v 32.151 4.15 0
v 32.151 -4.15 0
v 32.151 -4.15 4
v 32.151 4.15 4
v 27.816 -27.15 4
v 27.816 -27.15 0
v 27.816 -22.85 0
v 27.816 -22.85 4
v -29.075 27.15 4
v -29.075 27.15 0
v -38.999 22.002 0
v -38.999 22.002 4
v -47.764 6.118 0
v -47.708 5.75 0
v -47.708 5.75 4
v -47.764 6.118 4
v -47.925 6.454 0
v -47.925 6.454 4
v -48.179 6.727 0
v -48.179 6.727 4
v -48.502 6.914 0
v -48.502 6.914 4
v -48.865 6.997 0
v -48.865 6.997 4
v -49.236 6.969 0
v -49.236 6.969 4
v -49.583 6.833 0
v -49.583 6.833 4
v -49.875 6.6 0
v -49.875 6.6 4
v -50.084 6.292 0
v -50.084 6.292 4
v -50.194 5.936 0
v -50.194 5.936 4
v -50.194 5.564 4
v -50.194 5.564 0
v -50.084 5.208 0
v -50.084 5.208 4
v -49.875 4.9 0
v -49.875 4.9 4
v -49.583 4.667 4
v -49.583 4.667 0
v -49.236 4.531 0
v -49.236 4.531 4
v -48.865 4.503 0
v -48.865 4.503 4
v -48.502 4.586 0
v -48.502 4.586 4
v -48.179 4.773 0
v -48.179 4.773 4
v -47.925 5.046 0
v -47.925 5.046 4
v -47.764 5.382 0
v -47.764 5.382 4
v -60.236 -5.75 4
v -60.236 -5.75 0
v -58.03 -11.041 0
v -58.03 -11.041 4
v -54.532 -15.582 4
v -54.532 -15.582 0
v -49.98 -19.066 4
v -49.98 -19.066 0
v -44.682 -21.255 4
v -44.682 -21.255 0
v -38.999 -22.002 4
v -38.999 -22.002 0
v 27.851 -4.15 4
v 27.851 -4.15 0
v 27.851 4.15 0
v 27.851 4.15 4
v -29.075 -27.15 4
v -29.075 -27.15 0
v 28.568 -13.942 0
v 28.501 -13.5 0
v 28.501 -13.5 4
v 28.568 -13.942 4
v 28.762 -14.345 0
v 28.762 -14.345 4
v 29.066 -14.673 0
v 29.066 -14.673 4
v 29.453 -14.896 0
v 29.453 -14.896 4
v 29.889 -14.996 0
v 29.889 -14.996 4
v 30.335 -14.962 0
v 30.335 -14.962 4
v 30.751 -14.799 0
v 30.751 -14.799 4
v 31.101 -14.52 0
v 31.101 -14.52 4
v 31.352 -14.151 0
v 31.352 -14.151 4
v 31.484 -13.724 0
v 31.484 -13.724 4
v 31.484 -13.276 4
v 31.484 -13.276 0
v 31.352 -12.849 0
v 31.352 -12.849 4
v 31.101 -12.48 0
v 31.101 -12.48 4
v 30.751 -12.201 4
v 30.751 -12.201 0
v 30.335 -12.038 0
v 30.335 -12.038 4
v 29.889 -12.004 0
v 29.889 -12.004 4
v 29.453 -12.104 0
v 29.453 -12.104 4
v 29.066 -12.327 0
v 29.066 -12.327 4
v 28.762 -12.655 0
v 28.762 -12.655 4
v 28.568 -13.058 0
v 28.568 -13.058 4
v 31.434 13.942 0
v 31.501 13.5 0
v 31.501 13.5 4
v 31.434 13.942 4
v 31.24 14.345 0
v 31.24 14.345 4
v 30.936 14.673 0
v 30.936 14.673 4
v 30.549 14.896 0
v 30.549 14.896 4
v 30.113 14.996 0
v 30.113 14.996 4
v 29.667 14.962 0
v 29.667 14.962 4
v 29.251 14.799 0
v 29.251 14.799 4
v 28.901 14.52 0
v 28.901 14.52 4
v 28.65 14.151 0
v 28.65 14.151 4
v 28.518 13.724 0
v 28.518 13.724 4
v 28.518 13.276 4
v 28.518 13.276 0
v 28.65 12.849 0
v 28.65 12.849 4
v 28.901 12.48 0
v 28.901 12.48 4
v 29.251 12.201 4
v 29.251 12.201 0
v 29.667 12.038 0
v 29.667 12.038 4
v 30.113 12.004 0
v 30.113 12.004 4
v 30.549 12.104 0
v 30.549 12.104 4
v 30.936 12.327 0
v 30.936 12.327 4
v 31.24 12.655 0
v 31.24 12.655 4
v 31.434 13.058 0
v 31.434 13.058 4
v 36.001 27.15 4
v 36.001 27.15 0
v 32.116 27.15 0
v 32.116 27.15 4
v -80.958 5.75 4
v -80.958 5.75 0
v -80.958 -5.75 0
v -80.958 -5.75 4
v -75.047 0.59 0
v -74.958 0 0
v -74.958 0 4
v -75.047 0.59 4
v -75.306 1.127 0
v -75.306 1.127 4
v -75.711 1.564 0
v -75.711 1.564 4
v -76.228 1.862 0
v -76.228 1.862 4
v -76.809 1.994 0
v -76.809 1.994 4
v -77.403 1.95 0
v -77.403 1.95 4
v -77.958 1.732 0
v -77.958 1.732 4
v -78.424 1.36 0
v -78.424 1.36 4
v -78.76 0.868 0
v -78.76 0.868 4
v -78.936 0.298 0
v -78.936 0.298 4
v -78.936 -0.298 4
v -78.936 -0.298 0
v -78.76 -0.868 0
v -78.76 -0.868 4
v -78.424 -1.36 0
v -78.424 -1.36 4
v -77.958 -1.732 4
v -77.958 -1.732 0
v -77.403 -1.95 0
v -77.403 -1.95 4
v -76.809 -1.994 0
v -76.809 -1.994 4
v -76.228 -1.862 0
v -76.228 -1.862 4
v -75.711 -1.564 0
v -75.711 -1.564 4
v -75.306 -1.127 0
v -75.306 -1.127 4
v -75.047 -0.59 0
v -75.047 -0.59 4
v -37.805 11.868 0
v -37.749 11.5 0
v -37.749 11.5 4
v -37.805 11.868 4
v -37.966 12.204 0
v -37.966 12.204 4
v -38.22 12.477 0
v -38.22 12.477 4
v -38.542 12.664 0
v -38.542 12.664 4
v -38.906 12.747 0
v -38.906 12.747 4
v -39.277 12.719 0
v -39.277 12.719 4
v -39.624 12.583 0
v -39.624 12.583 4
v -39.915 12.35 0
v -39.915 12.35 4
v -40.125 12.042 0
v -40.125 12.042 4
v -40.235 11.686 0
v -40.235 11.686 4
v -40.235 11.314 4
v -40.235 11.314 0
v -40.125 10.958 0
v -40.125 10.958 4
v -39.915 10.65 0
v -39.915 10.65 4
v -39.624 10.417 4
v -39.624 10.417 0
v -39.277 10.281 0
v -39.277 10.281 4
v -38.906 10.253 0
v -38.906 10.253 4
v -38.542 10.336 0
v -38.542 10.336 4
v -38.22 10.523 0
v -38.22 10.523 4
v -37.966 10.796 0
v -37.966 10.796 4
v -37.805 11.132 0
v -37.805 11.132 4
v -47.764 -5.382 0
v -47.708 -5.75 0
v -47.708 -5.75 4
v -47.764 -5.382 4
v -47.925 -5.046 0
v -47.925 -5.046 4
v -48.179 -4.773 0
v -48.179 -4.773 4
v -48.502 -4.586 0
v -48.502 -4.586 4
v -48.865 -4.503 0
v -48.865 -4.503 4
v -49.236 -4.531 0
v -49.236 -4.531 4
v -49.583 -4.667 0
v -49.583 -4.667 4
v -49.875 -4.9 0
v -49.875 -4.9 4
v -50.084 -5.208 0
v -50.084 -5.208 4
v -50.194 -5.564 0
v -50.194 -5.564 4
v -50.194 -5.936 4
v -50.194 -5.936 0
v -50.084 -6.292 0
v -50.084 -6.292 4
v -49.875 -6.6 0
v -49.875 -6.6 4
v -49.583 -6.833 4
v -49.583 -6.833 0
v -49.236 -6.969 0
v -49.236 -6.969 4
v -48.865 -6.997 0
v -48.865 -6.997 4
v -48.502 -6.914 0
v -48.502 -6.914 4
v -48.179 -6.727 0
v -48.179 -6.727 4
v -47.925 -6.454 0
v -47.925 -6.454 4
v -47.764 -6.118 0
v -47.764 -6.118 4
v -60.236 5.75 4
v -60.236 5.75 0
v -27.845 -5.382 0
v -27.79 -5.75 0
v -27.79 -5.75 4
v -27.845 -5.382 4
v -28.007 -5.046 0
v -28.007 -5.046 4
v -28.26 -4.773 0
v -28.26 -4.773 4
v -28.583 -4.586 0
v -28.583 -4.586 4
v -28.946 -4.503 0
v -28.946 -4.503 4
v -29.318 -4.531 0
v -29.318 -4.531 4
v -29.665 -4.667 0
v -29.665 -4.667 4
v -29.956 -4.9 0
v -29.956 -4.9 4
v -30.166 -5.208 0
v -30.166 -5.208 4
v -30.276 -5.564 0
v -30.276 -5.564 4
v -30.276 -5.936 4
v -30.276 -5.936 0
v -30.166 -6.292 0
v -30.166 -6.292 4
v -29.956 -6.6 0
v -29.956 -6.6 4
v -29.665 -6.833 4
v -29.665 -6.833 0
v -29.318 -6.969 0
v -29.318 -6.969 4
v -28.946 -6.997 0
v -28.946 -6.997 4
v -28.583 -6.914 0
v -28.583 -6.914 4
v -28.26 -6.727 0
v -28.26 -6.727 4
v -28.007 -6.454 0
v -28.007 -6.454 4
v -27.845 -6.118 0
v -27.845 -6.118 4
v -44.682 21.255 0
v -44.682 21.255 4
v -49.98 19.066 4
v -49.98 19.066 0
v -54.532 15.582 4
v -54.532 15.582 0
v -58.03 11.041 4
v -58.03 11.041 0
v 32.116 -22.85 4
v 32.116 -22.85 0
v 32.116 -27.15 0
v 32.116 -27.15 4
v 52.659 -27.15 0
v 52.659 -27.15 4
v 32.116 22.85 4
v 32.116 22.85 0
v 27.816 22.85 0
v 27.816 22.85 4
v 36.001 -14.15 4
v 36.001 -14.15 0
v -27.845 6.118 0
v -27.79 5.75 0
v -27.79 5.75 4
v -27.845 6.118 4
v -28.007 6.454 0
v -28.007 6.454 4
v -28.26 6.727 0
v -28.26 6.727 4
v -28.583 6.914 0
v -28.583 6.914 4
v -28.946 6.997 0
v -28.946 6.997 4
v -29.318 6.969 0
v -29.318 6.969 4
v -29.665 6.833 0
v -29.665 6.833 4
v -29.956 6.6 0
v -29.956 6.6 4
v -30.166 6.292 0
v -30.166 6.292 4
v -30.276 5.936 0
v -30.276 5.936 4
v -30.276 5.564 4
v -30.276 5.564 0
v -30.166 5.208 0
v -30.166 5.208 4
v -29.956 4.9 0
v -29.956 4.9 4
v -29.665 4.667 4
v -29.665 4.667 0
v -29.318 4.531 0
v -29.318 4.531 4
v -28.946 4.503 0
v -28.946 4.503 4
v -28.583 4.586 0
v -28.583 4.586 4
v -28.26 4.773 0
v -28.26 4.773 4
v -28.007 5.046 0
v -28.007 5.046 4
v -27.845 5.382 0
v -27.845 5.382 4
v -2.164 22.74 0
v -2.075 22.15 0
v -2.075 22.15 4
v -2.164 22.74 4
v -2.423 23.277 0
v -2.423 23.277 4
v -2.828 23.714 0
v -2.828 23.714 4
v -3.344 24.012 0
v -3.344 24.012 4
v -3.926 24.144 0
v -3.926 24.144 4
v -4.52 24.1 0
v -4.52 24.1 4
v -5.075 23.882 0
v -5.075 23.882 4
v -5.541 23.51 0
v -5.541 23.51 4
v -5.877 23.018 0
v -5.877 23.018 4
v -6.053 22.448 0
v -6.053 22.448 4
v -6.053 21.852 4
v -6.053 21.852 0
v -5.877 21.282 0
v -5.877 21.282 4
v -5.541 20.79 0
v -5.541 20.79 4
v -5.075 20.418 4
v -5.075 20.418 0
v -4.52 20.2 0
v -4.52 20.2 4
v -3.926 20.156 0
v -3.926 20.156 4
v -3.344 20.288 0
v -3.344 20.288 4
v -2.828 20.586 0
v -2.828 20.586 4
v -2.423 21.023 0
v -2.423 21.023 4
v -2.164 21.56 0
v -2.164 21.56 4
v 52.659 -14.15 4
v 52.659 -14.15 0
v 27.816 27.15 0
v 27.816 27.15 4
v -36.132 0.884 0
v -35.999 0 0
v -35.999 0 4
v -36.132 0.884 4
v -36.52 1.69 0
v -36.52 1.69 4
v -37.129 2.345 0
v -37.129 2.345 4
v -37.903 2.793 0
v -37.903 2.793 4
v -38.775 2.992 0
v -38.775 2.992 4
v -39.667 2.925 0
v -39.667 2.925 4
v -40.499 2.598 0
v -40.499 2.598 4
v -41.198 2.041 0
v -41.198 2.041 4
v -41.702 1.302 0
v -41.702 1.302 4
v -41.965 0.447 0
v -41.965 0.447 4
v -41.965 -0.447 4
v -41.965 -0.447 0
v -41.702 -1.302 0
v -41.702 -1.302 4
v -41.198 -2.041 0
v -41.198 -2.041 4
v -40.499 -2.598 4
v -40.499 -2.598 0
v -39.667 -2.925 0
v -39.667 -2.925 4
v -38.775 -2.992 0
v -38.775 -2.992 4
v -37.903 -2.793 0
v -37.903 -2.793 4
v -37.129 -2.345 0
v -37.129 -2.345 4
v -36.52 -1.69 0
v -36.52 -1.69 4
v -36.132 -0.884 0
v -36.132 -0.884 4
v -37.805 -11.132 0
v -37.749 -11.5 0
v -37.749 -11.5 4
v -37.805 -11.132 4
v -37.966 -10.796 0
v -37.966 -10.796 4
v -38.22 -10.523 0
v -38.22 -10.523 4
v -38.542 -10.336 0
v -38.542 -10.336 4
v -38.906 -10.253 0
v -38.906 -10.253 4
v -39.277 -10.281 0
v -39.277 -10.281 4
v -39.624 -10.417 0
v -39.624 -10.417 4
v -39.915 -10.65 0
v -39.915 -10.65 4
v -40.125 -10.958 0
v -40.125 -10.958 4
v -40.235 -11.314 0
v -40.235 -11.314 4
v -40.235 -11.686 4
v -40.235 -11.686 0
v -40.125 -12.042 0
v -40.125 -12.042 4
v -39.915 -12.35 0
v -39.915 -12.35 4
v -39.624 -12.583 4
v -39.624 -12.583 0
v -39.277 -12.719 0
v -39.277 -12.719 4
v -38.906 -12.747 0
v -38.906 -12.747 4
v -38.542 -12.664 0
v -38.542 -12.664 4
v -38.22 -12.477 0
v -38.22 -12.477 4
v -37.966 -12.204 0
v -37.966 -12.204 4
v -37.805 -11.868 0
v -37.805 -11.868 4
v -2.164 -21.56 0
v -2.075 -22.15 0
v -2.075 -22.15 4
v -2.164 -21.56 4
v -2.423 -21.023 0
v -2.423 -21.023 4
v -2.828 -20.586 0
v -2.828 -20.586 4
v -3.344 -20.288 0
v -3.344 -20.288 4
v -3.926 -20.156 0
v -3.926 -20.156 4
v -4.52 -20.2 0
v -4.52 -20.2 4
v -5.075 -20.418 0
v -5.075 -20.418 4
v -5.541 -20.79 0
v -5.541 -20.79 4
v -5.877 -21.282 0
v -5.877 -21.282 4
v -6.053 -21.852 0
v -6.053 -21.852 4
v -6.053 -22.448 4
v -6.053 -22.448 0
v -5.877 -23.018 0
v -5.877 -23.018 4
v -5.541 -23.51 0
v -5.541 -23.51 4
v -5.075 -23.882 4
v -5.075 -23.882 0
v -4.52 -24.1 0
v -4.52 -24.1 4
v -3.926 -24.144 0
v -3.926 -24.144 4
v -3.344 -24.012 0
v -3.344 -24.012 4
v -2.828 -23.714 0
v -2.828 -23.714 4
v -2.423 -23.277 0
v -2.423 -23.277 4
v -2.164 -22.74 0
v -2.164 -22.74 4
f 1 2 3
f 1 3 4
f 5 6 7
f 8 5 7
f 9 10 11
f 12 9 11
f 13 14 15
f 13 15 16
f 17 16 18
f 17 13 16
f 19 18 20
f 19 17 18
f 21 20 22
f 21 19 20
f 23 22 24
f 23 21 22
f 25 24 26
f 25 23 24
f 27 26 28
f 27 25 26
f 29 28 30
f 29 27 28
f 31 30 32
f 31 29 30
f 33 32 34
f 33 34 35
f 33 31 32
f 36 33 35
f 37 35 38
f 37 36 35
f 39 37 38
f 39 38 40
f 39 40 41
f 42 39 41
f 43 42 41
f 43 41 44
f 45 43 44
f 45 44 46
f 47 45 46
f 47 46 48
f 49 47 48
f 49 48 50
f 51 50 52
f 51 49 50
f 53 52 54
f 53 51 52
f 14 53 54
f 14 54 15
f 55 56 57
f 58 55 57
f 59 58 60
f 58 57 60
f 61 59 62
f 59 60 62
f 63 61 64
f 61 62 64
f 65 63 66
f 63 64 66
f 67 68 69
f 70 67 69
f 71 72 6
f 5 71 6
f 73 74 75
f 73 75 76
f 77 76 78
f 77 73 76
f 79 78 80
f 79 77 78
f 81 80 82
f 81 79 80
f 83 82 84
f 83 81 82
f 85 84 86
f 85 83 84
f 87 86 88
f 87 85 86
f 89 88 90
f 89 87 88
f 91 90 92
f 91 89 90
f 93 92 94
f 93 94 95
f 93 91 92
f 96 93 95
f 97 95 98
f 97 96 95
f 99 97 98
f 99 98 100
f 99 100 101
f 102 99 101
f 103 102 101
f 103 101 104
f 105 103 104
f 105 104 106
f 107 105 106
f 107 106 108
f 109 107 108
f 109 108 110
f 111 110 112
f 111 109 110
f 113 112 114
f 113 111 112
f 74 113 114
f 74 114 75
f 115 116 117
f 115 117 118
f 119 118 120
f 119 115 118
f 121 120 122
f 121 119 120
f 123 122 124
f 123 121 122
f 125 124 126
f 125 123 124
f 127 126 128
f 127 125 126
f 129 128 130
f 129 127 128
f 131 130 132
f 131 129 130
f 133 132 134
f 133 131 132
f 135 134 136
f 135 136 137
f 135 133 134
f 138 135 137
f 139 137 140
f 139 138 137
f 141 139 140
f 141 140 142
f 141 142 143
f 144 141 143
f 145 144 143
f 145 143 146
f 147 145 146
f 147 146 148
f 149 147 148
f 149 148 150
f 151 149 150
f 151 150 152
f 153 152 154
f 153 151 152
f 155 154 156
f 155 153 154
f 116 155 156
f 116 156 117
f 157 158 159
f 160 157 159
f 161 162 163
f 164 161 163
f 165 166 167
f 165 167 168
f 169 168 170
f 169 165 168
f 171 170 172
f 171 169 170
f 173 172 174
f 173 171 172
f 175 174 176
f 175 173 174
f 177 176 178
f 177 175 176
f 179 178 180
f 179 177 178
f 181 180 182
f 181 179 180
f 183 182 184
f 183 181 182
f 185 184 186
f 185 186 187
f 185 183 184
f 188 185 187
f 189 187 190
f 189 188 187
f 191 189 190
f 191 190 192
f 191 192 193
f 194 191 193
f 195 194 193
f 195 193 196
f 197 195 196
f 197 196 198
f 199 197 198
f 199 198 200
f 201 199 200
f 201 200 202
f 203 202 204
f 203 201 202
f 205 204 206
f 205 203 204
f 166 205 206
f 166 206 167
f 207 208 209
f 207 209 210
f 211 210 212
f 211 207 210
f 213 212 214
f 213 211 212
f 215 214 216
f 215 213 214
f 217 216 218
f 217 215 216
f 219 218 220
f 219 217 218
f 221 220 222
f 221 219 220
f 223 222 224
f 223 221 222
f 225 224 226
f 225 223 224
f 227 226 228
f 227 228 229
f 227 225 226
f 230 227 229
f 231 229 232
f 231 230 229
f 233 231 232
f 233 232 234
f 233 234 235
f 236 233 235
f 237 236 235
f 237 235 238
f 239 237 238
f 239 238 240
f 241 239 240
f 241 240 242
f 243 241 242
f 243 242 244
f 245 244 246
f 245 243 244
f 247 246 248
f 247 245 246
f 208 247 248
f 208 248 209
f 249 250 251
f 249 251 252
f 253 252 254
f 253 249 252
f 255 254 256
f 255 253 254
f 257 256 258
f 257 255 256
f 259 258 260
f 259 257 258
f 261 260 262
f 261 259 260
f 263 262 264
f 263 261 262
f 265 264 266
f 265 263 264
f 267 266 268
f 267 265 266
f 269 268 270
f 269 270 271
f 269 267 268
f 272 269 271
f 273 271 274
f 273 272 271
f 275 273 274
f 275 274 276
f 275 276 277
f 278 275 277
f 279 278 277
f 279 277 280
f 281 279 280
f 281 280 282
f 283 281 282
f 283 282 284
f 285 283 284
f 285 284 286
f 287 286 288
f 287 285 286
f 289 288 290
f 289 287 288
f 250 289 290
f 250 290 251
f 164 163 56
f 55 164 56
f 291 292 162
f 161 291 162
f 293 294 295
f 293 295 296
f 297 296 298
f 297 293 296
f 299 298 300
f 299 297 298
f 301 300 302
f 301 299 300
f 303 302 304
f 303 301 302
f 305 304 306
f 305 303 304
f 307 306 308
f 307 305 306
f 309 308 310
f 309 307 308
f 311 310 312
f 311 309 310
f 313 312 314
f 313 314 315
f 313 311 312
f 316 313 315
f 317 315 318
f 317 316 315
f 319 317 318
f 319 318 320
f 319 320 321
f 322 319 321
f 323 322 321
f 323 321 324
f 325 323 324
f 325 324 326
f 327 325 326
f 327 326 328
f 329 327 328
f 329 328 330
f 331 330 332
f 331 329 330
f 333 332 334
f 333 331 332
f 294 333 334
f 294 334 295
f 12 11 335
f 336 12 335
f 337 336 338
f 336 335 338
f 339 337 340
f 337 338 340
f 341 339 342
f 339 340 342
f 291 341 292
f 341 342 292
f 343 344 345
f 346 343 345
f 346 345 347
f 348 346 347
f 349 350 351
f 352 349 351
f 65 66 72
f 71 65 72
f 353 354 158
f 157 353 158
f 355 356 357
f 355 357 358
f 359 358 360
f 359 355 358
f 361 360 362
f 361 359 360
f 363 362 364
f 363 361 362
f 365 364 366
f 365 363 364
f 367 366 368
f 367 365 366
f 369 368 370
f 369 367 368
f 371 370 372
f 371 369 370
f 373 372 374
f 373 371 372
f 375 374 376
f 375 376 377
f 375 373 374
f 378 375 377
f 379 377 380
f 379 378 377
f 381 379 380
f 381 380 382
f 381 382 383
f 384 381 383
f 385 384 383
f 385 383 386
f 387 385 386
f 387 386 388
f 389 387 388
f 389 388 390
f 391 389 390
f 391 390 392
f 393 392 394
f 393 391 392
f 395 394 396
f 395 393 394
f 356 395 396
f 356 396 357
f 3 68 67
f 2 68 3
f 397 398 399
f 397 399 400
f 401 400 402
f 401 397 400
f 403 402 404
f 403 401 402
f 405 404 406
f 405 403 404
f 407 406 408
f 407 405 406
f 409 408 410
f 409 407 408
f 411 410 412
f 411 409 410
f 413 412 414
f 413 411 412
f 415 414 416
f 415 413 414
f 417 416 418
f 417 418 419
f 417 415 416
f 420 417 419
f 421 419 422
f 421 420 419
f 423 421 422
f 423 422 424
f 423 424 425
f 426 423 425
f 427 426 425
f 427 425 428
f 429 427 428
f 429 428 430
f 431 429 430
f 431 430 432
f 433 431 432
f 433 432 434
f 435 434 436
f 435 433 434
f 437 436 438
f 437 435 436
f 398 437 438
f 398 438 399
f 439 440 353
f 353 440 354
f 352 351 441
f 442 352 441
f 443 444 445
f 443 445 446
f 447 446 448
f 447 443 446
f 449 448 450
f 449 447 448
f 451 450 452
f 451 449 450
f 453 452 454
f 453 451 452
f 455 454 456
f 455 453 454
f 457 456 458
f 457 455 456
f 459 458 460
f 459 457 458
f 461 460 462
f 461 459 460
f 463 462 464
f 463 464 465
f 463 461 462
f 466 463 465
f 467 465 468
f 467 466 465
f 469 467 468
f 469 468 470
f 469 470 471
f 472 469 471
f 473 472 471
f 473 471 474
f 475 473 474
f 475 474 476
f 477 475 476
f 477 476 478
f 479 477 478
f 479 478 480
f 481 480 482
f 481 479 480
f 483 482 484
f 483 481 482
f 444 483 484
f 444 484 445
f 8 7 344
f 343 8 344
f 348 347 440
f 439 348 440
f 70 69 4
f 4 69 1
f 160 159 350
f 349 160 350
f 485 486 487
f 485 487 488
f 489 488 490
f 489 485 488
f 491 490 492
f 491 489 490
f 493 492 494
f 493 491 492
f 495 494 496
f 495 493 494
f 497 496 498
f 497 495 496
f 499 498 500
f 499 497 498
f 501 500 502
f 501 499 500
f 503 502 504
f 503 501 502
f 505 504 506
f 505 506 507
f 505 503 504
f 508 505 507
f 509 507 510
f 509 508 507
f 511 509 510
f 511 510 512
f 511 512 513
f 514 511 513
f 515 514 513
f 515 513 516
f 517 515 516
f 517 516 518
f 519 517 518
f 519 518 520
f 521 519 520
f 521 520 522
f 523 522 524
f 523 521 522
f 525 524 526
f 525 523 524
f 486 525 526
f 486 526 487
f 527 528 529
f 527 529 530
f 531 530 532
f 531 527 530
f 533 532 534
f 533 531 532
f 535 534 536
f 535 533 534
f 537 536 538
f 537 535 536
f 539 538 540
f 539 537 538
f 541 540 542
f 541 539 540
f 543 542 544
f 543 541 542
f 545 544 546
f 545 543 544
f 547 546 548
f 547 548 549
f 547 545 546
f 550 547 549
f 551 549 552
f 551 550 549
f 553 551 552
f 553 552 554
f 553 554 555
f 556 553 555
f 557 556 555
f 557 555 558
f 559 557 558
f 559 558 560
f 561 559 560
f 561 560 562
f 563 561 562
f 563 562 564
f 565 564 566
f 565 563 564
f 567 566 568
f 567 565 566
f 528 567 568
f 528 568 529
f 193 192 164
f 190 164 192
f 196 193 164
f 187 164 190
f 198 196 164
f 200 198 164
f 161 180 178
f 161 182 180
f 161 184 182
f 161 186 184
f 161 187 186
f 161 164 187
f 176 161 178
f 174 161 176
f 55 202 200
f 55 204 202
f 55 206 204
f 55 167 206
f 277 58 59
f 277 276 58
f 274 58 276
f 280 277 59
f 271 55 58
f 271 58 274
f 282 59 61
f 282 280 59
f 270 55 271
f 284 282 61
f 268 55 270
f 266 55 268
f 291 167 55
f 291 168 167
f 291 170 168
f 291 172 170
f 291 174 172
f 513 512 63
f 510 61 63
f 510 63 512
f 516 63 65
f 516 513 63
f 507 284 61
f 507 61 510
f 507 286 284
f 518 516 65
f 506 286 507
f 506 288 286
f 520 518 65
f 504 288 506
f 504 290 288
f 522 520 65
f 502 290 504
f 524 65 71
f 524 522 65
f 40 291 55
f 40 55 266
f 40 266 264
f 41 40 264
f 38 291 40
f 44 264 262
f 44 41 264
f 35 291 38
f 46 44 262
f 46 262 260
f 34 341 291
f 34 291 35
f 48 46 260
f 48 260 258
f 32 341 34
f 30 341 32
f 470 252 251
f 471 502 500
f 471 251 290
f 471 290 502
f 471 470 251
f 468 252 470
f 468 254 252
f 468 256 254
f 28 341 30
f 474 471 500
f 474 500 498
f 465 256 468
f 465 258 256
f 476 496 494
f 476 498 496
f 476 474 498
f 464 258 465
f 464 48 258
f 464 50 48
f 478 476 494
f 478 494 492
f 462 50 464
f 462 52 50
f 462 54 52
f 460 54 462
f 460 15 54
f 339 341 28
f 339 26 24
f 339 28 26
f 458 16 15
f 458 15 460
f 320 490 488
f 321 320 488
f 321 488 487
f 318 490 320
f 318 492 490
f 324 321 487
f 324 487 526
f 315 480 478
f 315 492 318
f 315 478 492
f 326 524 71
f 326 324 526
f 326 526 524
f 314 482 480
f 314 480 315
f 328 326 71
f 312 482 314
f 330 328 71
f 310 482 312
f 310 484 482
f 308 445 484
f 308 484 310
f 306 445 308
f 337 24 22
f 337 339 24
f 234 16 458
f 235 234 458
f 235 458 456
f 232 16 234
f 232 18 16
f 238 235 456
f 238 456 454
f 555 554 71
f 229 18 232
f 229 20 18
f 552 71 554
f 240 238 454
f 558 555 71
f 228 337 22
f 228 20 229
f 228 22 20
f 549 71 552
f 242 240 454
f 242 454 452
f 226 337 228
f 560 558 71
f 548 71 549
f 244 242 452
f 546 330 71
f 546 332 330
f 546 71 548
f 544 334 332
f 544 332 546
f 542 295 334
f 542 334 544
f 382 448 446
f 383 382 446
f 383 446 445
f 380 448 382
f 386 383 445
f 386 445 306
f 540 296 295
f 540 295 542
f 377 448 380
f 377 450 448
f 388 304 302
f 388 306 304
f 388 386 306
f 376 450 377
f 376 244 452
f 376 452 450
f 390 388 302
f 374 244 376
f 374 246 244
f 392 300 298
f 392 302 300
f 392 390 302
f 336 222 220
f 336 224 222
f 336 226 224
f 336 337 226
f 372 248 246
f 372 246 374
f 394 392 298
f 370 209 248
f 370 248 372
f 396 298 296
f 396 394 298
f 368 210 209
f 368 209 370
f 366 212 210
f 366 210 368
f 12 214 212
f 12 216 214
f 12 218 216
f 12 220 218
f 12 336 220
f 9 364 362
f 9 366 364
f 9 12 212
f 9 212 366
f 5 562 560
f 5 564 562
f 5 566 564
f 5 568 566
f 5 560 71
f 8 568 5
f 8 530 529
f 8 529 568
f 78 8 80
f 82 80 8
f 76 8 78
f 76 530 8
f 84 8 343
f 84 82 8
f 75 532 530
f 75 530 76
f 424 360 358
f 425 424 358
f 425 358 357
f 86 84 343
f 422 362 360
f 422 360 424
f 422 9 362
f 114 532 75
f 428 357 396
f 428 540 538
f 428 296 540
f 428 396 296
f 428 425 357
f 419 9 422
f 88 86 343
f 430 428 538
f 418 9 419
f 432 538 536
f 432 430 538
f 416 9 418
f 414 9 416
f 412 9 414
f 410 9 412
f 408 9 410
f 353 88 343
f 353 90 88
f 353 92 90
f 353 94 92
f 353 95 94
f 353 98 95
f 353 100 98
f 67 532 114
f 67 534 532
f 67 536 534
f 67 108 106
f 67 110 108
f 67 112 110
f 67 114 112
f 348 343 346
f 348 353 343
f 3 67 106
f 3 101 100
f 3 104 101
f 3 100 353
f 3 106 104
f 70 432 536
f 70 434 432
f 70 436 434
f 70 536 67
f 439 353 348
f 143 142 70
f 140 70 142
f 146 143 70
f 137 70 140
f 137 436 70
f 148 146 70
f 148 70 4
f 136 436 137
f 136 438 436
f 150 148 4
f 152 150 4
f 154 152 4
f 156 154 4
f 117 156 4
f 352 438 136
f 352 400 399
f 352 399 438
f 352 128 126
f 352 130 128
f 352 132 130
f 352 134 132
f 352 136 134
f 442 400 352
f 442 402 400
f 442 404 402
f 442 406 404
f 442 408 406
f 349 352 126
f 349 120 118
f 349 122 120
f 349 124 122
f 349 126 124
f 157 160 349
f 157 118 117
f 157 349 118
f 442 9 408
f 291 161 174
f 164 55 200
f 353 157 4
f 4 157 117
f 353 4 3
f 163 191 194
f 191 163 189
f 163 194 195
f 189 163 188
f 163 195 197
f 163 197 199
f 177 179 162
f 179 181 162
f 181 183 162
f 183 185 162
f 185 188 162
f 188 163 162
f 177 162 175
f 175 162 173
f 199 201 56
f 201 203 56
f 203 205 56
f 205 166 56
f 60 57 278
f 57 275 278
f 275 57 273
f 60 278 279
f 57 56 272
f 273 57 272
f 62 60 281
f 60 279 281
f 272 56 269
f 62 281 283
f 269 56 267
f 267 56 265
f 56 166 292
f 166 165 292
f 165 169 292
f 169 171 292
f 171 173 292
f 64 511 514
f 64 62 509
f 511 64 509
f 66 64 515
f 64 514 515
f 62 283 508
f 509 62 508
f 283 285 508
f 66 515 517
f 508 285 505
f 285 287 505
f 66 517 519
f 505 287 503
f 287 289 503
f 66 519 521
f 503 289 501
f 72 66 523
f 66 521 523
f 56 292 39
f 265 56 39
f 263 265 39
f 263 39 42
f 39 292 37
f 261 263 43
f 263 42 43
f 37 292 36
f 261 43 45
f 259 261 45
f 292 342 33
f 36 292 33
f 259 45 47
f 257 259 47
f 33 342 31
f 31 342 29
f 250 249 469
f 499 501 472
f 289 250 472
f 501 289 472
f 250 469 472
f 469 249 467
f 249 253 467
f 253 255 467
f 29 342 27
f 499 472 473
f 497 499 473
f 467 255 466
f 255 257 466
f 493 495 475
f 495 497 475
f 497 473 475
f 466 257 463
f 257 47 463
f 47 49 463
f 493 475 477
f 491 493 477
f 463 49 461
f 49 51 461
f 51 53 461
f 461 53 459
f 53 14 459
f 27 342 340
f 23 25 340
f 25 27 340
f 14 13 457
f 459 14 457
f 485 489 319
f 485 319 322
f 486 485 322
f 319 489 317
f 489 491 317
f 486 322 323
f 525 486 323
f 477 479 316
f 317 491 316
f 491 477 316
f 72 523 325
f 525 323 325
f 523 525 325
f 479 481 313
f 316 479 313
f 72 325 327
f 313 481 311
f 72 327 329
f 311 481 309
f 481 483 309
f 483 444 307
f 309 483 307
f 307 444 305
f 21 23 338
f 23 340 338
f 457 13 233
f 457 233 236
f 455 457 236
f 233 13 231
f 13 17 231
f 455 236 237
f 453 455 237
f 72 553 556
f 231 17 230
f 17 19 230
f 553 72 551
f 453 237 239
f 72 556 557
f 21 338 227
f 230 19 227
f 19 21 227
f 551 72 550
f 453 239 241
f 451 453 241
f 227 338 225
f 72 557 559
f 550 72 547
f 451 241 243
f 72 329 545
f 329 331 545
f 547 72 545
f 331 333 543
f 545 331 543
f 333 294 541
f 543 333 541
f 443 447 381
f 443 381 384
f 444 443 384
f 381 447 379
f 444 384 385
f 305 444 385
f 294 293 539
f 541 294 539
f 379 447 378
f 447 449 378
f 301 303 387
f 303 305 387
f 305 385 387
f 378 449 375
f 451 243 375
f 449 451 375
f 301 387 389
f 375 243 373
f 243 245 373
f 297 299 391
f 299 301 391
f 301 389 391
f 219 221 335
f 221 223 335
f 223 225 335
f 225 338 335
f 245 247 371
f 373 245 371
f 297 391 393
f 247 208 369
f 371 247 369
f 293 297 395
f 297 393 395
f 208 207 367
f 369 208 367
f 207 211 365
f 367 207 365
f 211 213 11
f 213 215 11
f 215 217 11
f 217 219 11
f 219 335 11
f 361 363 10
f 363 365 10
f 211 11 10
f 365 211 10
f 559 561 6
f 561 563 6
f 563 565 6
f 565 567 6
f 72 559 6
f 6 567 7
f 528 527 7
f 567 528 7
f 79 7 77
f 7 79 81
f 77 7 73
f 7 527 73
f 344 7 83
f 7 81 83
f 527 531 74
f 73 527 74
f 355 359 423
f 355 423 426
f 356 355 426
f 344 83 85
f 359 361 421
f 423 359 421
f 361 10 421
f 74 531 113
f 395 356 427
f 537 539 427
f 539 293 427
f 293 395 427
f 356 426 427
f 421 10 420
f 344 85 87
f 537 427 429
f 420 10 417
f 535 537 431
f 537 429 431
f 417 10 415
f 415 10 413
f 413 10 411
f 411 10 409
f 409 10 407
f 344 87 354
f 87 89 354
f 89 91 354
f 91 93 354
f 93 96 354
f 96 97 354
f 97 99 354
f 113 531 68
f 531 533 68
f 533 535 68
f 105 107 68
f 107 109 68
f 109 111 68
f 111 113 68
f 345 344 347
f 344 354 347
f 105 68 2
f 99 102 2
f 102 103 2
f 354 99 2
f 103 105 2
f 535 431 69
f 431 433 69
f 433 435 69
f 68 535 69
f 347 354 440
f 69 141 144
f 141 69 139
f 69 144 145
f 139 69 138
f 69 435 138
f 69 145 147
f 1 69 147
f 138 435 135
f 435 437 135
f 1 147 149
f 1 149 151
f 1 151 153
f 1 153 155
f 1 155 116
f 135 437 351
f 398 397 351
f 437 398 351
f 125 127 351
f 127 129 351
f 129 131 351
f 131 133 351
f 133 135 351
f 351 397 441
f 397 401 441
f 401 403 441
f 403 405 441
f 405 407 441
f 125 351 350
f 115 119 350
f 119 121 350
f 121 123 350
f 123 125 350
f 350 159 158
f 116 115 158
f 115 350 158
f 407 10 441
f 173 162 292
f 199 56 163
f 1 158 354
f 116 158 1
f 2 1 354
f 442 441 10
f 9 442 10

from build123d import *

# Parameters (mm, degrees)
SKETCH_1_R      = 1.5
SKETCH_1_R_2    = 3
SKETCH_1_R_3    = 1.25
SKETCH_1_R_4    = 2
SKETCH_1_W      = 4.3
SKETCH_1_H      = 8.3
EXTRUDE_1_DEPTH = 4


with BuildPart() as part:
    # 草图1 → 凸台-拉伸1 (new body)
    with BuildSketch(Plane.XY):
        with BuildLine():
            Line((32.115707856, 27.15), (32.115707856, 22.85))
            Line((32.115707856, 22.85), (27.815707856, 22.85))
            Line((27.815707856, 22.85), (27.815707856, 27.15))
            Line((27.815707856, 27.15), (-29.075, 27.15))
            Line((-29.075, 27.15), (-38.998995168, 22.002009663))
            ThreePointArc((-38.998995168, 22.002009663), (-52.370174504, 17.472835843), (-60.236366221, 5.75))
            Line((-60.236366221, 5.75), (-80.958287312, 5.75))
            Line((-80.958287312, 5.75), (-80.958287312, -5.75))
            Line((-80.958287312, -5.75), (-60.236366221, -5.75))
            ThreePointArc((-60.236366221, -5.75), (-52.370174504, -17.472835843), (-38.998995168, -22.002009663))
            Line((-38.998995168, -22.002009663), (-29.075, -27.15))
            Line((-29.075, -27.15), (27.815707856, -27.15))
            Line((27.815707856, -27.15), (27.815707856, -22.85))
            Line((27.815707856, -22.85), (32.115707856, -22.85))
            Line((32.115707856, -22.85), (32.115707856, -27.15))
            Line((32.115707856, -27.15), (36.001004832, -27.15))
            Line((36.001004832, -27.15), (52.659242152, -27.15))
            Line((52.659242152, -27.15), (52.659242152, -14.15))
            Line((52.659242152, -14.15), (36.001004832, -14.15))
            Line((36.001004832, -14.15), (36.001004832, 27.15))
            Line((36.001004832, 27.15), (32.115707856, 27.15))
        make_face()
        with Locations((30.001004832, 13.5)):
            Circle(SKETCH_1_R, mode=Mode.SUBTRACT)
        with Locations(Location((30.001004832, -13.5, 0), (0, 0, 180))):
            Circle(SKETCH_1_R, mode=Mode.SUBTRACT)
        with Locations((-38.998995168, 0)):
            Circle(SKETCH_1_R_2, mode=Mode.SUBTRACT)
        with Locations((-38.998995168, -11.5)):
            Circle(SKETCH_1_R_3, mode=Mode.SUBTRACT)
        with Locations((-48.958287312, -5.75)):
            Circle(SKETCH_1_R_3, mode=Mode.SUBTRACT)
        with Locations((-48.958287312, 5.75)):
            Circle(SKETCH_1_R_3, mode=Mode.SUBTRACT)
        with Locations((-38.998995168, 11.5)):
            Circle(SKETCH_1_R_3, mode=Mode.SUBTRACT)
        with Locations((-29.039703025, 5.75)):
            Circle(SKETCH_1_R_3, mode=Mode.SUBTRACT)
        with Locations((-29.039703025, -5.75)):
            Circle(SKETCH_1_R_3, mode=Mode.SUBTRACT)
        with Locations((-4.075, -22.15)):
            Circle(SKETCH_1_R_4, mode=Mode.SUBTRACT)
        with Locations((-4.075, 22.15)):
            Circle(SKETCH_1_R_4, mode=Mode.SUBTRACT)
        with Locations((-76.958287312, 0)):
            Circle(SKETCH_1_R_4, mode=Mode.SUBTRACT)
        with Locations((30.001004832, 0)):
            Rectangle(SKETCH_1_W, SKETCH_1_H, mode=Mode.SUBTRACT)
    extrude(amount=EXTRUDE_1_DEPTH)


solid = part.part
